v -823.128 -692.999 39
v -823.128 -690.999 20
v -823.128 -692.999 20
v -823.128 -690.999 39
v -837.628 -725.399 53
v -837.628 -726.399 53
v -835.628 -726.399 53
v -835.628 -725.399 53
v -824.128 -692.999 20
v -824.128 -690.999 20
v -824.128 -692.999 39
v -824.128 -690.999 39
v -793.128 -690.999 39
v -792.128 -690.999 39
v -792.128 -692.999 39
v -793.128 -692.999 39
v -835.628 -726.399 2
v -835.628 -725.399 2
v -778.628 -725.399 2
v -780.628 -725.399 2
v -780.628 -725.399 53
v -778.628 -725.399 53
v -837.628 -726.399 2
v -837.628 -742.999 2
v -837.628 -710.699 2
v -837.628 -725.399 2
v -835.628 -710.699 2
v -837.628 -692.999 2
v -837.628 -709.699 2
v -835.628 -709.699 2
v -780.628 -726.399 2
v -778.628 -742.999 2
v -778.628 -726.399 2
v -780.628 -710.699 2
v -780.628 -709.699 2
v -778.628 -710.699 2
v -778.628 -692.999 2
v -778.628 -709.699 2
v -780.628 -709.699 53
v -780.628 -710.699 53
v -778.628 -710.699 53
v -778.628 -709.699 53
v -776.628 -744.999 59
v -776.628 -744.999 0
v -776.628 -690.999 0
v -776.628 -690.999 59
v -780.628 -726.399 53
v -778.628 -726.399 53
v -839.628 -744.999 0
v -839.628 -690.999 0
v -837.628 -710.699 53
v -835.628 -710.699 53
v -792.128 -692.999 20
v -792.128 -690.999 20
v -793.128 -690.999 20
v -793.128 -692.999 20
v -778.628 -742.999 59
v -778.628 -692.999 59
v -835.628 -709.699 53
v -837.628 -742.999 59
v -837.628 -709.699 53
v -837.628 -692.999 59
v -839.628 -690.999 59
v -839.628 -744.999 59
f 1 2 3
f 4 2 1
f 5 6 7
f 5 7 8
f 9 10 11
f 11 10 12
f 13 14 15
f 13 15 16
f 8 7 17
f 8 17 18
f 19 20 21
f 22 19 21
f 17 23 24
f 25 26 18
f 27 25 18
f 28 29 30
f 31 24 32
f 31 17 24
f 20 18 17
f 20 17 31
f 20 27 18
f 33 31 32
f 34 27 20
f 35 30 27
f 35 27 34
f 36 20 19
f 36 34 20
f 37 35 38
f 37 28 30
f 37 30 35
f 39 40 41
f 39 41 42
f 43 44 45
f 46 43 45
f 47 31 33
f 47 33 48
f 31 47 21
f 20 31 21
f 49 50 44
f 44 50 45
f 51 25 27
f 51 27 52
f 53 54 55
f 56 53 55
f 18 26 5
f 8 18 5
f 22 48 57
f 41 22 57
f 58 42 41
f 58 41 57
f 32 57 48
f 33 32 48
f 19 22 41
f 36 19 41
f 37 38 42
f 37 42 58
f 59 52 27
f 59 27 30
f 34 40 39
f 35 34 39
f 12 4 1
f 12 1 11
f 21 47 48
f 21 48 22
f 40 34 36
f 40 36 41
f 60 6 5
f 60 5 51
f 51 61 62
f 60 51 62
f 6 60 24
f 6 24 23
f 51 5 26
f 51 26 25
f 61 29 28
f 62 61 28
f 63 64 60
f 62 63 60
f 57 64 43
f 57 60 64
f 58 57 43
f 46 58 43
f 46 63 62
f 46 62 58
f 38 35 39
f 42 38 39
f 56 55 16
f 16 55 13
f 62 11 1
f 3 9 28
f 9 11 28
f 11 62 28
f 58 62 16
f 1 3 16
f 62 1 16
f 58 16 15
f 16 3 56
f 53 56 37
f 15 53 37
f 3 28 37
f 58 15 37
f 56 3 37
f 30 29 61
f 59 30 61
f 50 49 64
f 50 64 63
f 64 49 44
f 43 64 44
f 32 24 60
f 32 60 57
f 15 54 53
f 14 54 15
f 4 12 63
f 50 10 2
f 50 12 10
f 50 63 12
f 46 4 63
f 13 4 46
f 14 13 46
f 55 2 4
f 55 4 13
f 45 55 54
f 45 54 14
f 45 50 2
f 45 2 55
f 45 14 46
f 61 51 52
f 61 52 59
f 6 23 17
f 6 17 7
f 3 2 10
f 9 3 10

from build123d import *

# Parameters (mm, degrees)
F0_W     = 63
F0_H     = 54
F0_W_2   = 59
F0_H_2   = 50
F1_DEPTH = 59
F2_DEPTH = 2
F3_W     = 1
F3_H     = 51
F4_DEPTH = 2
F5_START = 57
F5_DEPTH = 2
F6_W     = 1
F6_H     = 19
F7_DEPTH = 3


with BuildPart() as f1:
    # F0 (on Top) → F1 (new body)
    with BuildSketch(Plane.XY):
        with Locations((-808.1280109427, -717.9987351179)):
            Rectangle(F0_W, F0_H)
        with Locations((-808.1280109427, -717.9987351179)):
            Rectangle(F0_W_2, F0_H_2, mode=Mode.SUBTRACT)
    extrude(amount=F1_DEPTH)

    # F0 (on Top) → F2 (join)
    with BuildSketch(Plane.XY):
        with Locations((-808.1280109427, -717.9987351179)):
            Rectangle(F0_W_2, F0_H_2)
    extrude(amount=F2_DEPTH)

    # F3 (on face) → F4 (join)
    with BuildSketch(Plane.YZ.offset(-837.6280109427)):
        with Locations((-710.1987351179, 27.5)):
            Rectangle(F3_W, F3_H)
        with Locations((-725.8987351179, 27.5)):
            Rectangle(F3_W, F3_H)
    extrude(amount=F4_DEPTH)

    # F3 (on face) → F5 (join)
    with BuildSketch(Plane.YZ.offset(-837.6280109427).offset(F5_START)):
        with Locations((-710.1987351179, 27.5)):
            Rectangle(F3_W, F3_H)
        with Locations((-725.8987351179, 27.5)):
            Rectangle(F3_W, F3_H)
    extrude(amount=F5_DEPTH)

    # F6 (on face) → F7 (cut)
    with BuildSketch(Plane(origin=(0, -690.9987351179, 0), x_dir=(-1, 0, 0), z_dir=(0, 1, 0))):
        with Locations((823.6280109427, 29.5)):
            Rectangle(F6_W, F6_H)
        with Locations((792.6280109427, 29.5)):
            Rectangle(F6_W, F6_H)
    extrude(amount=-F7_DEPTH, mode=Mode.SUBTRACT)


solid = f1.part
